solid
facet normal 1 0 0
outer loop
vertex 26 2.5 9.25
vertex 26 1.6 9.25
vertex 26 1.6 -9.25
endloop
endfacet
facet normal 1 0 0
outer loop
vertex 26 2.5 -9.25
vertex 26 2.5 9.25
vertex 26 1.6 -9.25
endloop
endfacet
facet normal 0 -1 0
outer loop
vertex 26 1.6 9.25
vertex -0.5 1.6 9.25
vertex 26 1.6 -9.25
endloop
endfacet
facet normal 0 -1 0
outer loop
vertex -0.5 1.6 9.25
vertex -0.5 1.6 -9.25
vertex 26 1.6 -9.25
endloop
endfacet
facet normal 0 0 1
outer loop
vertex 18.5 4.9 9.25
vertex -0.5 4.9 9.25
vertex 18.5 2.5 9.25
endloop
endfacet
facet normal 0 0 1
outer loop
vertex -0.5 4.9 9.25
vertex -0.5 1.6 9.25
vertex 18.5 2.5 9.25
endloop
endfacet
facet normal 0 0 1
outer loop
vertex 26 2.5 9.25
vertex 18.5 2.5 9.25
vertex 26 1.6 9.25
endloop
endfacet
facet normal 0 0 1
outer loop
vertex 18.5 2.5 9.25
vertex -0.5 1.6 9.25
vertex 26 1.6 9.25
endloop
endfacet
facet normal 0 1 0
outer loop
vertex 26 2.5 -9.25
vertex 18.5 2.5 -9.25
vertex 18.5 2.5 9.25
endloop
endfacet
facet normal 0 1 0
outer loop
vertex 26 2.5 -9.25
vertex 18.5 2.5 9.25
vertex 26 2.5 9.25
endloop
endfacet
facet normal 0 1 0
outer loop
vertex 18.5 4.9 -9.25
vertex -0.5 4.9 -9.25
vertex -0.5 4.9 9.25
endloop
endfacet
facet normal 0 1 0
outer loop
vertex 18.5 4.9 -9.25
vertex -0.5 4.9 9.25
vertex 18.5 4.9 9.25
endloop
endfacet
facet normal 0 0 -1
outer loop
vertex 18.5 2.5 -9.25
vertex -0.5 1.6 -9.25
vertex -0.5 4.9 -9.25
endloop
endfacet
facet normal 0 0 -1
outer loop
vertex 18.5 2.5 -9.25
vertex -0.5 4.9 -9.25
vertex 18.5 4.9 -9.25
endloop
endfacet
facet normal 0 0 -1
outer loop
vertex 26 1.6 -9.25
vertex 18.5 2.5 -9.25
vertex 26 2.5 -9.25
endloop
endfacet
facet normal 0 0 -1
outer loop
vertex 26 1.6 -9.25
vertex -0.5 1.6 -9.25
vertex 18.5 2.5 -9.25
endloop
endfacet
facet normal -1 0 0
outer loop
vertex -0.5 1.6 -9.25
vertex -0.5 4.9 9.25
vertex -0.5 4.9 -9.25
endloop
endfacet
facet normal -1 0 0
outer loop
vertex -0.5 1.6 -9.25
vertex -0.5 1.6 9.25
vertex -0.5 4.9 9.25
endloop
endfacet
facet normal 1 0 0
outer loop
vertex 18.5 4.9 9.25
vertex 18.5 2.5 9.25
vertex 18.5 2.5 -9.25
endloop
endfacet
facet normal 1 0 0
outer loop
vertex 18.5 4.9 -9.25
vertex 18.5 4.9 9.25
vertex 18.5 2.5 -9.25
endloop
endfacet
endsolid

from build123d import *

# Parameters (mm, degrees)
SKETCH1_W                  = 52
SKETCH1_H                  = 28.5
SKETCH1_R                  = 1.6
BOSS_EXTRUDE1_DEPTH        = 1.6
FILLET1_R                  = 2
SKETCH2_W                  = 6
SKETCH2_H                  = 8
BOSS_EXTRUDE2_DEPTH        = 2.6
SKETCH3_W                  = 26.5
SKETCH3_H                  = 18.5
BOSS_EXTRUDE3_DEPTH        = 0.9
SKETCH4_W                  = 19
SKETCH4_H                  = 18.5
BOSS_EXTRUDE4_DEPTH        = 2.4
SKETCH5_W                  = 4.480247742
SKETCH5_H                  = 2.767211841
SKETCH5_H_2                = 2.398250262
BOSS_EXTRUDE5_DEPTH        = 2
CUT_EXTRUDE1_START         = -1.6
CUT_EXTRUDE1_OUTLINE_R     = 1.6
CUT_EXTRUDE1_DEPTH         = 1.6
CUT_EXTRUDE1_2_OUTLINE_W   = 6
CUT_EXTRUDE1_2_OUTLINE_H   = 8
CUT_EXTRUDE1_2_OUTLINE_W_2 = 4.480247742
CUT_EXTRUDE1_2_OUTLINE_H_2 = 2.767211841
CUT_EXTRUDE1_2_OUTLINE_H_3 = 2.398250262
CUT_EXTRUDE1_2_DEPTH       = 2.6


# Read off the part's stored shape, not the designer's step: Cut-Extrude1
with BuildPart() as part:
    # Sketch1 → Boss-Extrude1 (new body)
    with BuildSketch(Plane(origin=(0, 0, 0), x_dir=(1, 0, 0), z_dir=(0, 1, 0))):
        Rectangle(SKETCH1_W, SKETCH1_H)
        with Locations(Location((-23.7, 11.55, 0), (0, 0, 270))):
            Circle(SKETCH1_R, mode=Mode.SUBTRACT)
        with Locations(Location((-23.7, -11.55, 0), (0, 0, 270))):
            Circle(SKETCH1_R, mode=Mode.SUBTRACT)
        with Locations(Location((23.4, 11.55, 0), (0, 0, 270))):
            Circle(SKETCH1_R, mode=Mode.SUBTRACT)
        with Locations(Location((23.4, -11.55, 0), (0, 0, 270))):
            Circle(SKETCH1_R, mode=Mode.SUBTRACT)
    extrude(amount=BOSS_EXTRUDE1_DEPTH)

    # Fillet1
    fillet1_edges = [part.edges().sort_by_distance(p)[0] for p in [
        (-26, 0.8, -14.25),
        (26, 0.8, -14.25),
        (26, 0.8, 14.25),
        (-26, 0.8, 14.25),
    ]]
    fillet(fillet1_edges, radius=FILLET1_R)

    # Sketch2 → Boss-Extrude2 (add)
    with BuildSketch(Plane(origin=(0, 1.6, 0), x_dir=(1, 0, 0), z_dir=(0, 1, 0))):
        with Locations((-23, 0)):
            Rectangle(SKETCH2_W, SKETCH2_H)
    extrude(amount=BOSS_EXTRUDE2_DEPTH)

    # Sketch3 → Boss-Extrude3 (add)
    with BuildSketch(Plane(origin=(0, 1.6, 0), x_dir=(1, 0, 0), z_dir=(0, 1, 0))):
        with Locations((12.75, 0)):
            Rectangle(SKETCH3_W, SKETCH3_H)
    extrude(amount=BOSS_EXTRUDE3_DEPTH)

    # Sketch4 → Boss-Extrude4 (add)
    with BuildSketch(Plane(origin=(0, 2.5, 0), x_dir=(1, 0, 0), z_dir=(0, 1, 0))):
        with Locations((9, 0)):
            Rectangle(SKETCH4_W, SKETCH4_H)
    extrude(amount=BOSS_EXTRUDE4_DEPTH)

    # Sketch5 → Boss-Extrude5 (add)
    with BuildSketch(Plane(origin=(0, 1.6, 0), x_dir=(1, 0, 0), z_dir=(0, 1, 0))):
        with Locations((-23.323642657, 8.222572326)):
            Rectangle(SKETCH5_W, SKETCH5_H)
        with Locations((-23.323642657, -8.459761913)):
            Rectangle(SKETCH5_W, SKETCH5_H_2)
    extrude(amount=BOSS_EXTRUDE5_DEPTH)

    # Cut-Extrude1 outline → Cut-Extrude1 (cut)
    with BuildSketch(Plane(origin=(0, 1.6, 0), x_dir=(1, 0, 0), z_dir=(0, 1, 0)).offset(CUT_EXTRUDE1_START)):
        with BuildLine():
            ThreePointArc((-26, -12.25), (-25.414213562, -13.664213562), (-24, -14.25))
            Line((-24, -14.25), (24, -14.25))
            ThreePointArc((24, -14.25), (25.414213562, -13.664213562), (26, -12.25))
            Line((26, -12.25), (26, 12.25))
            ThreePointArc((26, 12.25), (25.414213562, 13.664213562), (24, 14.25))
            Line((24, 14.25), (-24, 14.25))
            ThreePointArc((-24, 14.25), (-25.414213562, 13.664213562), (-26, 12.25))
            Line((-26, 12.25), (-26, -12.25))
        make_face()
        with Locations((-23.7, -11.55)):
            Circle(CUT_EXTRUDE1_OUTLINE_R, mode=Mode.SUBTRACT)
        with Locations((23.4, -11.55)):
            Circle(CUT_EXTRUDE1_OUTLINE_R, mode=Mode.SUBTRACT)
        with Locations((-23.7, 11.55)):
            Circle(CUT_EXTRUDE1_OUTLINE_R, mode=Mode.SUBTRACT)
        with Locations((23.4, 11.55)):
            Circle(CUT_EXTRUDE1_OUTLINE_R, mode=Mode.SUBTRACT)
    extrude(amount=CUT_EXTRUDE1_DEPTH, mode=Mode.SUBTRACT)

    # Cut-Extrude1 2 outline → Cut-Extrude1 2 (cut)
    with BuildSketch(Plane(origin=(0, 1.6, 0), x_dir=(1, 0, 0), z_dir=(0, 1, 0))):
        with Locations((-23, 0)):
            Rectangle(CUT_EXTRUDE1_2_OUTLINE_W, CUT_EXTRUDE1_2_OUTLINE_H)
        with Locations((-23.323642657, 8.222572326)):
            Rectangle(CUT_EXTRUDE1_2_OUTLINE_W_2, CUT_EXTRUDE1_2_OUTLINE_H_2)
        with Locations((-23.323642657, -8.459761913)):
            Rectangle(CUT_EXTRUDE1_2_OUTLINE_W_2, CUT_EXTRUDE1_2_OUTLINE_H_3)
    extrude(amount=CUT_EXTRUDE1_2_DEPTH, mode=Mode.SUBTRACT)


solid = part.part
